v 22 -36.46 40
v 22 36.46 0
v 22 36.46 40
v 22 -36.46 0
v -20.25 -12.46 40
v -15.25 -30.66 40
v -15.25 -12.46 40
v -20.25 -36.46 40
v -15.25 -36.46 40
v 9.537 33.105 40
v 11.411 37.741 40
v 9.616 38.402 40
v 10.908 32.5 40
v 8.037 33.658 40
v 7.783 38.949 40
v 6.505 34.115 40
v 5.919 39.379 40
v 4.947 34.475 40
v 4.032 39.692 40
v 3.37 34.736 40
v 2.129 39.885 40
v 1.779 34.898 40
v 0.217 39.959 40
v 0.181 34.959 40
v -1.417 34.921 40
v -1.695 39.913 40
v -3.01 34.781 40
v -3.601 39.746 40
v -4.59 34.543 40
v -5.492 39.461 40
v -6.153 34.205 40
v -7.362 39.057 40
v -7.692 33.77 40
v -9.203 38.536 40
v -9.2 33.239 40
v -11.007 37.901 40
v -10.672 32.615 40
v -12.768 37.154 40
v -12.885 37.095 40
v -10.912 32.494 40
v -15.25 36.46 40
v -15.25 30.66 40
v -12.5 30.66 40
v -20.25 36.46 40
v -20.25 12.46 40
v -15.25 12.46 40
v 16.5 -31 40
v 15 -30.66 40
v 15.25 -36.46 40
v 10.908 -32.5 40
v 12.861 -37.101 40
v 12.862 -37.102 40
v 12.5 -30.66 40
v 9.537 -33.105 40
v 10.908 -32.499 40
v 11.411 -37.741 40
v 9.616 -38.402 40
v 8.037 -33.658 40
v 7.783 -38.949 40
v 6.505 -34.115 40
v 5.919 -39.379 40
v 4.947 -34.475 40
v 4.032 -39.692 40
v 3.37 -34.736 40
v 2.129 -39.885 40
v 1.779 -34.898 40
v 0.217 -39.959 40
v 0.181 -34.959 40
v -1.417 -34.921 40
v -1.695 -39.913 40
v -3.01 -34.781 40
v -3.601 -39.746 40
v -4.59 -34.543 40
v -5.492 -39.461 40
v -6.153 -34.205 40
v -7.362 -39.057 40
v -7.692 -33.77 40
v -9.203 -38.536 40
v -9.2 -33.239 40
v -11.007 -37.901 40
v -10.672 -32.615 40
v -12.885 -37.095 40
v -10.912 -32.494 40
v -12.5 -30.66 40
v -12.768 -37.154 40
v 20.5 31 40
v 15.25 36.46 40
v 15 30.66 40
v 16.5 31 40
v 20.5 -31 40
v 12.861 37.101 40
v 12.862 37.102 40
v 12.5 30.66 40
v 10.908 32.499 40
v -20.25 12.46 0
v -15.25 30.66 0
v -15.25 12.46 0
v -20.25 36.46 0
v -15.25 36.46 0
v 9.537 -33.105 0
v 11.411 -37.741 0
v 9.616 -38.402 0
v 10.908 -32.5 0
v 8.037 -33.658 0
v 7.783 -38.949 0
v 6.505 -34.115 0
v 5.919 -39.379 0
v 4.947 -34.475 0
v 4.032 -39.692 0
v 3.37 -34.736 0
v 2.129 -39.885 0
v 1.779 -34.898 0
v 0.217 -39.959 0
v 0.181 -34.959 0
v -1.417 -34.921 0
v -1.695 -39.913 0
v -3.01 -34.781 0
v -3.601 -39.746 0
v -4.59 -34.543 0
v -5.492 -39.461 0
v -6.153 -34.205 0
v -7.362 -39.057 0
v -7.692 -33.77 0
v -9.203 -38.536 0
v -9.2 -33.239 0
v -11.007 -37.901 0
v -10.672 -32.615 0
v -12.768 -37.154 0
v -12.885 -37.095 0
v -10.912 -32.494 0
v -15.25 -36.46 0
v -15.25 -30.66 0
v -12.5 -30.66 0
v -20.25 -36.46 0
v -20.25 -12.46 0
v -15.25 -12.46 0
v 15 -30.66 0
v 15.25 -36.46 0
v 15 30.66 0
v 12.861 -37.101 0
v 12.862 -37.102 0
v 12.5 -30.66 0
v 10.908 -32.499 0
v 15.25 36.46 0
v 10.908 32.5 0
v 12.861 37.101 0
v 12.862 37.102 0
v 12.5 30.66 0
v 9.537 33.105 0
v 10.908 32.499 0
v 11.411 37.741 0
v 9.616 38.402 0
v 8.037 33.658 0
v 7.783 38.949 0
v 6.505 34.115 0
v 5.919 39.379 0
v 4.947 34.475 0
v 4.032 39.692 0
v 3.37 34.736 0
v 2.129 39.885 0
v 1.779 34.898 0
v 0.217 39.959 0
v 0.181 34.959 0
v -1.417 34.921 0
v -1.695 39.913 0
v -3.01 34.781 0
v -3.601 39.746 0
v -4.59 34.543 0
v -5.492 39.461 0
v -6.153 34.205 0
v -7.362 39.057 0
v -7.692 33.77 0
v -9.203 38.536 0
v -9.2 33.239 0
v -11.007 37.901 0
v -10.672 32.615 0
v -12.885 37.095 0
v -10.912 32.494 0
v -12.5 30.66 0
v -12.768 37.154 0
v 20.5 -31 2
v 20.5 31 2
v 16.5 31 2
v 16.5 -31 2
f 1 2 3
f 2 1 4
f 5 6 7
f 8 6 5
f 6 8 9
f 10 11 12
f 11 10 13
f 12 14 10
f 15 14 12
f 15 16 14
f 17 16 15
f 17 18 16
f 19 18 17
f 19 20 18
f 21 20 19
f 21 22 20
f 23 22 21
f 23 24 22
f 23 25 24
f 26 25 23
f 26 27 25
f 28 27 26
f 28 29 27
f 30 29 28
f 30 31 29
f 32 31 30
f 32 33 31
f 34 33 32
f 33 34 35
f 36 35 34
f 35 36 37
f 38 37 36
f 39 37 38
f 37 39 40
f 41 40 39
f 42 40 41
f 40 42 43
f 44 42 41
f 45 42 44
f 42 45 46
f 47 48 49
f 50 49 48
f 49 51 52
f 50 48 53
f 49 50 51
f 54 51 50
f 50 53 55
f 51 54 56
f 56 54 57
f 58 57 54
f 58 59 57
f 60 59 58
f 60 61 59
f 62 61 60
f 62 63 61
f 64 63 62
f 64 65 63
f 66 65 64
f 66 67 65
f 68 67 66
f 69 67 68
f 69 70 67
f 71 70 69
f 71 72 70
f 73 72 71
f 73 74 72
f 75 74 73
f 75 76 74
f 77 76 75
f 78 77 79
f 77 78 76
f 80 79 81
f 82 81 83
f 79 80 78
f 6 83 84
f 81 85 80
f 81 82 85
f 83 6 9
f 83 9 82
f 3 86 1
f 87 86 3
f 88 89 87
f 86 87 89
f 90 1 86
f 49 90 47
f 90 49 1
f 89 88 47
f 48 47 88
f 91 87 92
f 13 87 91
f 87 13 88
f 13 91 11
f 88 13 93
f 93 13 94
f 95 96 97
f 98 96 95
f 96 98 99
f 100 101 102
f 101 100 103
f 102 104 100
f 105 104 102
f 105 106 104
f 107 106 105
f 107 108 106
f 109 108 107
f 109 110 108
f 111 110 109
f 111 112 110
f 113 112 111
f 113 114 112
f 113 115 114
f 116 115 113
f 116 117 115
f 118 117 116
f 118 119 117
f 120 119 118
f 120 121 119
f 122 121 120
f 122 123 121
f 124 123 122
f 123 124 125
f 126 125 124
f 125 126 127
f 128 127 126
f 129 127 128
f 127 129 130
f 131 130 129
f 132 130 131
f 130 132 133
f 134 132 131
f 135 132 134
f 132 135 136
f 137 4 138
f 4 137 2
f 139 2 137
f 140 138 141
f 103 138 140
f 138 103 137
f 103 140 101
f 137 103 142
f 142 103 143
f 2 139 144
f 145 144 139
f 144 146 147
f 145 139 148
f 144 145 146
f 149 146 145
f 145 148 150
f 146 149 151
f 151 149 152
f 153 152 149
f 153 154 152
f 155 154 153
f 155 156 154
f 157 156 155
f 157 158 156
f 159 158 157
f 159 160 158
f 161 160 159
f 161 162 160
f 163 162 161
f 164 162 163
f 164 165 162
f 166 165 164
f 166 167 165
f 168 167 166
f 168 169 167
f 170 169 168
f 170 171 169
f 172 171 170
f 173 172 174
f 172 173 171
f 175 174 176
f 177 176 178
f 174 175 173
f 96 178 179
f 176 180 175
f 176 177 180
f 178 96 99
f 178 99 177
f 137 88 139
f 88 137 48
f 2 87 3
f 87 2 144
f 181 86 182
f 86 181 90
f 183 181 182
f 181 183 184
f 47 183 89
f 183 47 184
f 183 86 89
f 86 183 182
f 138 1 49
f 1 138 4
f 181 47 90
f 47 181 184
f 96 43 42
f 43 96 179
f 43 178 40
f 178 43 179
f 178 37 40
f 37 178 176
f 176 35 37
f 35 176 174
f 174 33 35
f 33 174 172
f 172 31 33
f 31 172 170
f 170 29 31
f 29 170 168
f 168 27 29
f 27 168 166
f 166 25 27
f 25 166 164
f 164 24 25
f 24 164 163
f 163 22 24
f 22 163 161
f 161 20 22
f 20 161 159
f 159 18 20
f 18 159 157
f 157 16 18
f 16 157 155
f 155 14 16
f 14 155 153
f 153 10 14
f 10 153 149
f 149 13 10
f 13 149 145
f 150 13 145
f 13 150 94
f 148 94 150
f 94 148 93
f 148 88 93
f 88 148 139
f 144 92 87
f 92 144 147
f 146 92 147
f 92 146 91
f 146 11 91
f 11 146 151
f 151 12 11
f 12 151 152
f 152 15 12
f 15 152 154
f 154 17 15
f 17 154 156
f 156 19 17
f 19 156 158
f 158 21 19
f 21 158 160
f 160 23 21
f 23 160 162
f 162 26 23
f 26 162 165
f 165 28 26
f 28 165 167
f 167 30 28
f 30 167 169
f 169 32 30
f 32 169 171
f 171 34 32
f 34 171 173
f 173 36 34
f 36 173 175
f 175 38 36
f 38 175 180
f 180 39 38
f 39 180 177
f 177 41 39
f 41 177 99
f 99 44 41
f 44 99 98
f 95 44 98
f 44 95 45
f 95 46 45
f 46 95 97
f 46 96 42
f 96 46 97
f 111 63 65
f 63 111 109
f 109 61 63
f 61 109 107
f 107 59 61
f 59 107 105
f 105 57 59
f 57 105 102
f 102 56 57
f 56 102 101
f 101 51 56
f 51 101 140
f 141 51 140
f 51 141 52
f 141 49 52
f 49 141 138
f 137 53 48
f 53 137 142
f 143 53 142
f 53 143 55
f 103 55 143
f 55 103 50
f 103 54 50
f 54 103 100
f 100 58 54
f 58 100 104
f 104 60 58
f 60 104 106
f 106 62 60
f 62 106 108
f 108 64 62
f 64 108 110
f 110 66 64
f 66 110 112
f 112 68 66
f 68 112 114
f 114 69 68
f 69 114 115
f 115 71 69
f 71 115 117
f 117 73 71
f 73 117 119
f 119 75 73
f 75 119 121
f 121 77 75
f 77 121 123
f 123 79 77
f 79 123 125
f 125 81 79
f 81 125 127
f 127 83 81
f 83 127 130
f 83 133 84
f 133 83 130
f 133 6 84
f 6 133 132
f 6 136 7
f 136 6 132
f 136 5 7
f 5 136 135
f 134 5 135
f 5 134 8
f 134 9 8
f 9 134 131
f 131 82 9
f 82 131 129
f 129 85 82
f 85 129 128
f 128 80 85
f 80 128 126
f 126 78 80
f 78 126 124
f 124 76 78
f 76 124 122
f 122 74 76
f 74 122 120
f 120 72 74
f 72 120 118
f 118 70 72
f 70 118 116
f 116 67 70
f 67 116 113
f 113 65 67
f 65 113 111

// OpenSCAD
// file: ../../modules/isosceles.scad
module isosceles(height, vertex_angle) polygon(points =
  let (length = height / cos(vertex_angle / 2)) [
    [0, 0],
    [length, 0],
    [length * cos(vertex_angle), length * sin(vertex_angle)]
  ]
);
// file: ../../modules/chord.scad
use <./isosceles.scad>

module chord(l, h, t = 1) {
  r = (l^2) / (8*h) + h / 2;
  angle = 2 * asin(l / (2*r));

  translate([0, h - r]) rotate(90 - angle/2) intersection() {
    difference() {
      circle(r = r + t);
      circle(r = r);
    }

    // TODO: handle angles >= 180
    isosceles(height = r + t, vertex_angle = angle);
  }
}
// file: ../../modules/copy_mirror.scad
module copy_mirror(uvec) {
  children();
  mirror(uvec) children();
}
// main file
use <../../modules/copy_mirror.scad>
use <../../modules/chord.scad>

$fn = 100;

thickness = 5;
height = 40;

linear_extrude(height = height) copy_mirror([0, 1]) translate([0, 31.46]) {
  translate([0, 1]) chord(l = 22, h = 2.5, t = thickness);

  copy_mirror([1, 0]) translate([22 / 2, 0]) hull() {
    translate([0, 1]) rotate(67) square([thickness, 0.1]);
    translate([1.5, -0.8]) square([0.1, 0.1]);
    translate([3.25, -0.8]) square([1, 0.8 + thickness]);
  }

  translate([-20.25, -19]) square([thickness, 19 + thickness]);
}

translate([15, 0]) copy_mirror([0, 1]) difference() {
  cube([7, 31.46 + thickness, height]);

  translate([1.5, -0.1, 2]) cube([4, 31 + 0.1, height + 0.1]);
}
